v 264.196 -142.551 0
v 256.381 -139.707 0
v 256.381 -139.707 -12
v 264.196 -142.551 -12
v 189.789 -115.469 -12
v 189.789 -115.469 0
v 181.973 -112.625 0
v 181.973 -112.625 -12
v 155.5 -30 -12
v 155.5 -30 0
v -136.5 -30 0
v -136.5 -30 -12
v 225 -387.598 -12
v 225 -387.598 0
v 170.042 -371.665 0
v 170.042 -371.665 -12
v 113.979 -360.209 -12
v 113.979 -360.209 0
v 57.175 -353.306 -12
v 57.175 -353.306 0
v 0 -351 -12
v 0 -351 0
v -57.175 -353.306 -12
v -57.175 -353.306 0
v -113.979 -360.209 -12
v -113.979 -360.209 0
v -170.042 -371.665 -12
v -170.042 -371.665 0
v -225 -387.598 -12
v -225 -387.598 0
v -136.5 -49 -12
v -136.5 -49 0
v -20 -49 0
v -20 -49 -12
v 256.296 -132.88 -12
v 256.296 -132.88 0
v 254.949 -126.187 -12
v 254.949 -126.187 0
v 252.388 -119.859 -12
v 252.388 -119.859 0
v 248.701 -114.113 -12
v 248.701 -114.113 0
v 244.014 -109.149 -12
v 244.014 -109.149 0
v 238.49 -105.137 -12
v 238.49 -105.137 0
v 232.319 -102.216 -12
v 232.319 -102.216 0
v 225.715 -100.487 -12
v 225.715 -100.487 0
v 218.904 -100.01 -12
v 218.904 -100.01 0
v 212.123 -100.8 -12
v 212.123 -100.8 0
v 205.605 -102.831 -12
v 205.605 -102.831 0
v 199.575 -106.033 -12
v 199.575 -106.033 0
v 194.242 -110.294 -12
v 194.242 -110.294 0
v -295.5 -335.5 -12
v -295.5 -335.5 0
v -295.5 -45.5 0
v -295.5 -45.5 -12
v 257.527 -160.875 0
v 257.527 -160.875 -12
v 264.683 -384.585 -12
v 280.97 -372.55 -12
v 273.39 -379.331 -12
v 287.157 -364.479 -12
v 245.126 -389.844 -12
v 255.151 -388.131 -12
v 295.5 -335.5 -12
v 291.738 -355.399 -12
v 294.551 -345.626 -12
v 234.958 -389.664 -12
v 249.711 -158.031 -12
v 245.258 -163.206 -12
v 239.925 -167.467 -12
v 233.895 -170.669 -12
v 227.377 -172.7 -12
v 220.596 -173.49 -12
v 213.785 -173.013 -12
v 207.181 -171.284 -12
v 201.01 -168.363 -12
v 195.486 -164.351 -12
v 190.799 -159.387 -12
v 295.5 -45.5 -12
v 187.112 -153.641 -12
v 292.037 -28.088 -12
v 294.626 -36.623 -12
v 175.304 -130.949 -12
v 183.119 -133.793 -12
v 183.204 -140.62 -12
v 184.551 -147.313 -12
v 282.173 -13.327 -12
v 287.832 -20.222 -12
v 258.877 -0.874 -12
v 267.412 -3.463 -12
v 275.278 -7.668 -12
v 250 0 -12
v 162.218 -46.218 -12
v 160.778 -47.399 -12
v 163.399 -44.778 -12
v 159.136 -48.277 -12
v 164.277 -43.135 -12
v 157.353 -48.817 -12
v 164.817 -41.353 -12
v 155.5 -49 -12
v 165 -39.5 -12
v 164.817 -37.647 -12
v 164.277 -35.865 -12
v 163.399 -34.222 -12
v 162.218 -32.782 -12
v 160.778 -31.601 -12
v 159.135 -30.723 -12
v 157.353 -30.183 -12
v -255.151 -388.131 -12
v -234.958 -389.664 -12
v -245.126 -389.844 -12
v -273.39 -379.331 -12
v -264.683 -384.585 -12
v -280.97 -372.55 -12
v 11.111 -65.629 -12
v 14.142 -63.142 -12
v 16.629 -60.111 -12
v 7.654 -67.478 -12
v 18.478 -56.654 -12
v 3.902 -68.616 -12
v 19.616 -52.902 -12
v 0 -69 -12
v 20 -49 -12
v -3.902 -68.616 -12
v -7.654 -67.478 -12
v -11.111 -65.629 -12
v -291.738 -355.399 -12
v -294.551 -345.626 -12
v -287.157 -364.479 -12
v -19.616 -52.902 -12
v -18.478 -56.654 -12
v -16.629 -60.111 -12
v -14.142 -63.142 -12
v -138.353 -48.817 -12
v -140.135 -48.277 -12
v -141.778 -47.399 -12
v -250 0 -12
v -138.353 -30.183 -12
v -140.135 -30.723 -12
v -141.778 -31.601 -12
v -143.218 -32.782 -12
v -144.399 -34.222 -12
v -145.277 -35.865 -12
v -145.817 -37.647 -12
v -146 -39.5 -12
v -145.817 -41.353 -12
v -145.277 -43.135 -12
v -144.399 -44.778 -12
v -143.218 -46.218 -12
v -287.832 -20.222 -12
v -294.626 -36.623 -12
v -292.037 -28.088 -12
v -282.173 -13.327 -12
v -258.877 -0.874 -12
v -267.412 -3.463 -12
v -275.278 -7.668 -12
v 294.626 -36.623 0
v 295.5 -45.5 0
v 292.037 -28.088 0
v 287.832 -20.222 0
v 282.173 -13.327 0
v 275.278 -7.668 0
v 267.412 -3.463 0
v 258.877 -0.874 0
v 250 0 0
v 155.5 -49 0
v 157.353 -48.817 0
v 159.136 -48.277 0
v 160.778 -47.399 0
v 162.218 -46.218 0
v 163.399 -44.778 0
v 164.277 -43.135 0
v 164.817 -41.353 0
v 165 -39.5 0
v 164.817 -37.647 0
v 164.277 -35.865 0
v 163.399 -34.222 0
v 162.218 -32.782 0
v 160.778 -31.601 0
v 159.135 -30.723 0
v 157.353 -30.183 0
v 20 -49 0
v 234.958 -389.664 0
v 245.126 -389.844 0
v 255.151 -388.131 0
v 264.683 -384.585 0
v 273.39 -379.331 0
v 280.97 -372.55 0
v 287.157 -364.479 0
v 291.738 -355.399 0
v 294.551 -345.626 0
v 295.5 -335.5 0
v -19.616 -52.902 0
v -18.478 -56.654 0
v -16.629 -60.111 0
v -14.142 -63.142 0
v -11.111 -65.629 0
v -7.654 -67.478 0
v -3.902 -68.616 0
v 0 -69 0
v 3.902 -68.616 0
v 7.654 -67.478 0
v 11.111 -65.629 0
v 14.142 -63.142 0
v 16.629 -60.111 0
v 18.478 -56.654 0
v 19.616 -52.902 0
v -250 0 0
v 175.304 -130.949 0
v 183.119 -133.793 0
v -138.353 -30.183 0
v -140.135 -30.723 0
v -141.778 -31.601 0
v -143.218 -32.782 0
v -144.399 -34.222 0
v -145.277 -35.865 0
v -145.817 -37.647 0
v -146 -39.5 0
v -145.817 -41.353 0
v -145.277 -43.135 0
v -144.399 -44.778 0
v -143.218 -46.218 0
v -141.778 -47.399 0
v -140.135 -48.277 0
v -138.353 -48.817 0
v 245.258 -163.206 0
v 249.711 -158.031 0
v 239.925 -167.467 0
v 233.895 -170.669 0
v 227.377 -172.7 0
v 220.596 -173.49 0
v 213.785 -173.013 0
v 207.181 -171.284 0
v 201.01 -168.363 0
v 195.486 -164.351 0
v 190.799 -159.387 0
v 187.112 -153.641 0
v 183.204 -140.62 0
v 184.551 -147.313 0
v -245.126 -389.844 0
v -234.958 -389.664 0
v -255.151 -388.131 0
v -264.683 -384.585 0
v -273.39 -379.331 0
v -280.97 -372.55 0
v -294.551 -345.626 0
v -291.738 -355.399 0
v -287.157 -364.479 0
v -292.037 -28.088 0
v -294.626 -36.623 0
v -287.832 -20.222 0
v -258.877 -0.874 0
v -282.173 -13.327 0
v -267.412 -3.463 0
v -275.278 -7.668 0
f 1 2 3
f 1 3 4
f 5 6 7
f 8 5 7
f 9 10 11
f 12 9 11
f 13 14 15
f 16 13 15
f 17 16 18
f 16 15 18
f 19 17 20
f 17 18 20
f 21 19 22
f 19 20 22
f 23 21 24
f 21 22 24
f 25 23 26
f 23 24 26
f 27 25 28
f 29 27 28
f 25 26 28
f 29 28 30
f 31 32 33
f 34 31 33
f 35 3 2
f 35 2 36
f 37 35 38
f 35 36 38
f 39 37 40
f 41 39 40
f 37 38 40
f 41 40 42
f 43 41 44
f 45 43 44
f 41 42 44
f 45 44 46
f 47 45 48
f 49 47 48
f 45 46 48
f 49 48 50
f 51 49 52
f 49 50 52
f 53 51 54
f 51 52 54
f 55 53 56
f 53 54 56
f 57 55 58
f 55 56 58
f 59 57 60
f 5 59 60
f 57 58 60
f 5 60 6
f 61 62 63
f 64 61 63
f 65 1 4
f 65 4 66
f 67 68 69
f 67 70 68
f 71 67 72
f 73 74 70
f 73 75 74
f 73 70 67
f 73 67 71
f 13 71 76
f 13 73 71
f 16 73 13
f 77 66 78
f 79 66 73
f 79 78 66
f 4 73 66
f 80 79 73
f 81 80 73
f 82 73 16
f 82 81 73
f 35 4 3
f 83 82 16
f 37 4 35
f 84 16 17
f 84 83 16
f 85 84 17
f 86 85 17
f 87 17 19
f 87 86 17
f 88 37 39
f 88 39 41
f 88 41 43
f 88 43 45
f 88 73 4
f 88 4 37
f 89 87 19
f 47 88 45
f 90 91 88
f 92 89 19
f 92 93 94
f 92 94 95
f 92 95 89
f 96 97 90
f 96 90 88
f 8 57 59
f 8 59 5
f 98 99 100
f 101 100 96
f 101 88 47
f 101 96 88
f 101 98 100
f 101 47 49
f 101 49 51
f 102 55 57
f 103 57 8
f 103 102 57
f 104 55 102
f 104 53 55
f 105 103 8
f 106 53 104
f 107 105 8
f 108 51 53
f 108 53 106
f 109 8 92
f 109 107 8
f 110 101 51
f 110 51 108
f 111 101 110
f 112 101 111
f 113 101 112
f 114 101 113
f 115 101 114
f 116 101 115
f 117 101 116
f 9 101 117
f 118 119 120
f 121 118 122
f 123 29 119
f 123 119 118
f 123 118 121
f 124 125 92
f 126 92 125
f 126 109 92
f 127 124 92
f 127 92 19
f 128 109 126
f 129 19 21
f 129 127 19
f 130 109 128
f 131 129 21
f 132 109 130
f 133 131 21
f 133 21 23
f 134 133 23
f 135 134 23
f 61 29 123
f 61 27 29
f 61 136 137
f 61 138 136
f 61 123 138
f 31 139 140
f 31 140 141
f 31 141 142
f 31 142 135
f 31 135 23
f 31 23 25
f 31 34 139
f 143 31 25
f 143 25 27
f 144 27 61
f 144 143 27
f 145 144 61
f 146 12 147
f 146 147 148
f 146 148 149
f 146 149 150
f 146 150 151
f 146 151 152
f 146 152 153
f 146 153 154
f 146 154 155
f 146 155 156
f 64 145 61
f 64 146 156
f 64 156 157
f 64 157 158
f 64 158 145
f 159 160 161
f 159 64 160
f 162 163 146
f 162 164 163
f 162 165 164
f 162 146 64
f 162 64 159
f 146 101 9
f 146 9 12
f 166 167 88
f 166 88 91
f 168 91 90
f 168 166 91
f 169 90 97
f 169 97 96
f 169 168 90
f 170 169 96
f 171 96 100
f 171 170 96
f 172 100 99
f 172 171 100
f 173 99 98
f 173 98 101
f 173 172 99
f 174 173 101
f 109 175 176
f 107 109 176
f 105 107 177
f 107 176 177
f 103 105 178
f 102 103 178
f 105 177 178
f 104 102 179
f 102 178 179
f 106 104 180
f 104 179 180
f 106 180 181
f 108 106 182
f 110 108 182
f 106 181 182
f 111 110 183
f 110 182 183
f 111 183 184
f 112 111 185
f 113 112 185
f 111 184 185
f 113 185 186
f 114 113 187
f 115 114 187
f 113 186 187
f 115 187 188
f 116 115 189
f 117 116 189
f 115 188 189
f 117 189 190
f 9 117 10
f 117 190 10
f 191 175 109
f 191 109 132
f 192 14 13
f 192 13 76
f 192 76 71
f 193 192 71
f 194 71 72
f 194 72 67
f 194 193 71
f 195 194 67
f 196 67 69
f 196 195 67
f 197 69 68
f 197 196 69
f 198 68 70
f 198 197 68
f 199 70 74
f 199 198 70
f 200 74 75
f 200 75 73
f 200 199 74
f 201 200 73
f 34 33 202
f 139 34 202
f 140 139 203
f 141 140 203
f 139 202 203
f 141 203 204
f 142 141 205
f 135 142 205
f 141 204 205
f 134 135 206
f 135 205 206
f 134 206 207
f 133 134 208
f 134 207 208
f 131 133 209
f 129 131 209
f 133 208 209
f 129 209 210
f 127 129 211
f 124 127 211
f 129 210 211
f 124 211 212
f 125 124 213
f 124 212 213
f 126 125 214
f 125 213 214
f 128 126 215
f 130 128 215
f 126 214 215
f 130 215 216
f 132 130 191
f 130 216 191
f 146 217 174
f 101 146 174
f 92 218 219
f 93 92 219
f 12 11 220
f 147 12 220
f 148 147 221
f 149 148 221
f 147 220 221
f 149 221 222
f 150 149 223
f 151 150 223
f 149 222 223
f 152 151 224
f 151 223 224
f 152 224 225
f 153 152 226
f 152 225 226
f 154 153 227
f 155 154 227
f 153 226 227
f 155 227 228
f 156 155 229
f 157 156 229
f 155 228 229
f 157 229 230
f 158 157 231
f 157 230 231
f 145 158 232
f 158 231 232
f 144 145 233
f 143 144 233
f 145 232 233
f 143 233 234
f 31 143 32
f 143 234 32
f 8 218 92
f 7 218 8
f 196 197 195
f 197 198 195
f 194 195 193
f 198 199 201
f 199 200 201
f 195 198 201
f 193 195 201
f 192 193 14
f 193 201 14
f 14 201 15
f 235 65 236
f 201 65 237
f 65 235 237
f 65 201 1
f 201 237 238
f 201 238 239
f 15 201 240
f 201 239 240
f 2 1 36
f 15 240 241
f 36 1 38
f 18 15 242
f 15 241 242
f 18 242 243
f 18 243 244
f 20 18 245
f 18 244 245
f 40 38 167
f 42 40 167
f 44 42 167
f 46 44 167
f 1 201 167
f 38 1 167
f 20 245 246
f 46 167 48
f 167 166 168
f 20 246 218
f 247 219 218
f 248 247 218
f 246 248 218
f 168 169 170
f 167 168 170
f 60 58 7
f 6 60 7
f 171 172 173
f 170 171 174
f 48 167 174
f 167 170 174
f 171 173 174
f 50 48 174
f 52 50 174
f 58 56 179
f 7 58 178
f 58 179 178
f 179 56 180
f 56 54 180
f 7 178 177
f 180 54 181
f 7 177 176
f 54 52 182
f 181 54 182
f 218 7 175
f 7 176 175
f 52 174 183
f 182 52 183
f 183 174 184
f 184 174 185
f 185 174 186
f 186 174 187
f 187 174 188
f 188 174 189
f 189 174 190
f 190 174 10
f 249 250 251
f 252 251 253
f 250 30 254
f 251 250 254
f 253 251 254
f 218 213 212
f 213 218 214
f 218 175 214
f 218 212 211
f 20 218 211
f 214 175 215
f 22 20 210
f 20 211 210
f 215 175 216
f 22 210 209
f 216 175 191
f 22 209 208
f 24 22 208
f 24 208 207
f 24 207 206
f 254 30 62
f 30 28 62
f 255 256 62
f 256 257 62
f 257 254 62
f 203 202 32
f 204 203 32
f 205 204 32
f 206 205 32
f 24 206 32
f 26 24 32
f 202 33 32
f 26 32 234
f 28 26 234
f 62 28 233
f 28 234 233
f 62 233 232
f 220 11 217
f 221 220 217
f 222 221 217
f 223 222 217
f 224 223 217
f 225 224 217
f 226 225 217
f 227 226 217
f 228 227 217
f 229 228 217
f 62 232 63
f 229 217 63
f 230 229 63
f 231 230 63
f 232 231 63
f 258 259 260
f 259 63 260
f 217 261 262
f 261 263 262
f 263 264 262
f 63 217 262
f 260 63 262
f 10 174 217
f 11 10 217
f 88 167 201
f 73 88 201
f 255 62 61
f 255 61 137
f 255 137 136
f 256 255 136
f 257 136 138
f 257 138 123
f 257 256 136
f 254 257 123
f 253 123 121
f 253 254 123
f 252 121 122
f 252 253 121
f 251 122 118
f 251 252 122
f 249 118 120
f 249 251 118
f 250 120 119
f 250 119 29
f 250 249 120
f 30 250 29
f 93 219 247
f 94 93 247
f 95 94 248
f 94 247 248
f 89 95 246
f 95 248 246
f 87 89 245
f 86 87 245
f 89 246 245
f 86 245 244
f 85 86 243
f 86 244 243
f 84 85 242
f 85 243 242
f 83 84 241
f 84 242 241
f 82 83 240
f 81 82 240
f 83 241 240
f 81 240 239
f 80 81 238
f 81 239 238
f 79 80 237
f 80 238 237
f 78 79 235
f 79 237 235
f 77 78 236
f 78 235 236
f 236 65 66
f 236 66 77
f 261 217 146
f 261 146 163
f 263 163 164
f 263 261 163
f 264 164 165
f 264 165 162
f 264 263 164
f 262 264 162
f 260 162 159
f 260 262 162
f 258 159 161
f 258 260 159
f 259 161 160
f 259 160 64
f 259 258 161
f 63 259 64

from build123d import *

# Parameters (mm, degrees)
PAD_DEPTH       = 12
POCKET_DEPTH    = 12
POCKET001_DEPTH = 12


with BuildPart() as part:
    # Sketch → Pad (new body)
    with BuildSketch(Plane.XY):
        with BuildLine():
            Line((-250, 0), (250, 0))
            ThreePointArc((295.5, -45.5), (282.173358544, -13.326641456), (250, 0))
            Line((295.5, -45.5), (295.5, -335.5))
            ThreePointArc((225, -387.5984644687), (273.3901991349, -379.3306399679), (295.5, -335.5))
            ThreePointArc((225, -387.5984644687), (0, -351), (-225, -387.5984644687))
            ThreePointArc((-295.5, -335.5), (-273.3901991349, -379.3306399679), (-225, -387.5984644687))
            Line((-295.5, -335.5), (-295.5, -45.5))
            ThreePointArc((-250, 0), (-282.173358544, -13.326641456), (-295.5, -45.5))
        make_face()
    extrude(amount=-PAD_DEPTH)

    # Sketch001 → Pocket (cut)
    with BuildSketch(Plane.XY):
        with BuildLine():
            ThreePointArc((-136.5, -30), (-146, -39.5), (-136.5, -49))
            Line((-136.5, -49), (-20, -49))
            ThreePointArc((-20, -49), (0, -69), (20, -49))
            Line((155.5000159433, -49), (20, -49))
            ThreePointArc((155.5000159433, -49), (165, -39.4999920284), (155.5, -30))
            Line((155.5, -30), (-136.5, -30))
        make_face()
    extrude(amount=-POCKET_DEPTH, mode=Mode.SUBTRACT)

    # Sketch002 → Pocket001 (cut)
    with BuildSketch(Plane.XY):
        with BuildLine():
            ThreePointArc((256.3808583259, -139.7068088046), (232.3192402672, -102.2162961861), (189.7885344689, -115.4691850901))
            Line((189.7885344689, -115.4691850901), (181.973144238, -112.6246156768))
            Line((175.3037514432, -130.9486217822), (181.973144238, -112.6246156768))
            Line((175.3037514432, -130.9486217822), (183.1191416741, -133.7931911954))
            ThreePointArc((183.1191416741, -133.7931911954), (207.1807597328, -171.2837038139), (249.7114655311, -158.0308149099))
            Line((257.526855762, -160.8753843232), (249.7114655311, -158.0308149099))
            Line((264.1962485568, -142.5513782178), (257.526855762, -160.8753843232))
            Line((256.3808583259, -139.7068088046), (264.1962485568, -142.5513782178))
        make_face()
    extrude(amount=-POCKET001_DEPTH, mode=Mode.SUBTRACT)


solid = part.part
